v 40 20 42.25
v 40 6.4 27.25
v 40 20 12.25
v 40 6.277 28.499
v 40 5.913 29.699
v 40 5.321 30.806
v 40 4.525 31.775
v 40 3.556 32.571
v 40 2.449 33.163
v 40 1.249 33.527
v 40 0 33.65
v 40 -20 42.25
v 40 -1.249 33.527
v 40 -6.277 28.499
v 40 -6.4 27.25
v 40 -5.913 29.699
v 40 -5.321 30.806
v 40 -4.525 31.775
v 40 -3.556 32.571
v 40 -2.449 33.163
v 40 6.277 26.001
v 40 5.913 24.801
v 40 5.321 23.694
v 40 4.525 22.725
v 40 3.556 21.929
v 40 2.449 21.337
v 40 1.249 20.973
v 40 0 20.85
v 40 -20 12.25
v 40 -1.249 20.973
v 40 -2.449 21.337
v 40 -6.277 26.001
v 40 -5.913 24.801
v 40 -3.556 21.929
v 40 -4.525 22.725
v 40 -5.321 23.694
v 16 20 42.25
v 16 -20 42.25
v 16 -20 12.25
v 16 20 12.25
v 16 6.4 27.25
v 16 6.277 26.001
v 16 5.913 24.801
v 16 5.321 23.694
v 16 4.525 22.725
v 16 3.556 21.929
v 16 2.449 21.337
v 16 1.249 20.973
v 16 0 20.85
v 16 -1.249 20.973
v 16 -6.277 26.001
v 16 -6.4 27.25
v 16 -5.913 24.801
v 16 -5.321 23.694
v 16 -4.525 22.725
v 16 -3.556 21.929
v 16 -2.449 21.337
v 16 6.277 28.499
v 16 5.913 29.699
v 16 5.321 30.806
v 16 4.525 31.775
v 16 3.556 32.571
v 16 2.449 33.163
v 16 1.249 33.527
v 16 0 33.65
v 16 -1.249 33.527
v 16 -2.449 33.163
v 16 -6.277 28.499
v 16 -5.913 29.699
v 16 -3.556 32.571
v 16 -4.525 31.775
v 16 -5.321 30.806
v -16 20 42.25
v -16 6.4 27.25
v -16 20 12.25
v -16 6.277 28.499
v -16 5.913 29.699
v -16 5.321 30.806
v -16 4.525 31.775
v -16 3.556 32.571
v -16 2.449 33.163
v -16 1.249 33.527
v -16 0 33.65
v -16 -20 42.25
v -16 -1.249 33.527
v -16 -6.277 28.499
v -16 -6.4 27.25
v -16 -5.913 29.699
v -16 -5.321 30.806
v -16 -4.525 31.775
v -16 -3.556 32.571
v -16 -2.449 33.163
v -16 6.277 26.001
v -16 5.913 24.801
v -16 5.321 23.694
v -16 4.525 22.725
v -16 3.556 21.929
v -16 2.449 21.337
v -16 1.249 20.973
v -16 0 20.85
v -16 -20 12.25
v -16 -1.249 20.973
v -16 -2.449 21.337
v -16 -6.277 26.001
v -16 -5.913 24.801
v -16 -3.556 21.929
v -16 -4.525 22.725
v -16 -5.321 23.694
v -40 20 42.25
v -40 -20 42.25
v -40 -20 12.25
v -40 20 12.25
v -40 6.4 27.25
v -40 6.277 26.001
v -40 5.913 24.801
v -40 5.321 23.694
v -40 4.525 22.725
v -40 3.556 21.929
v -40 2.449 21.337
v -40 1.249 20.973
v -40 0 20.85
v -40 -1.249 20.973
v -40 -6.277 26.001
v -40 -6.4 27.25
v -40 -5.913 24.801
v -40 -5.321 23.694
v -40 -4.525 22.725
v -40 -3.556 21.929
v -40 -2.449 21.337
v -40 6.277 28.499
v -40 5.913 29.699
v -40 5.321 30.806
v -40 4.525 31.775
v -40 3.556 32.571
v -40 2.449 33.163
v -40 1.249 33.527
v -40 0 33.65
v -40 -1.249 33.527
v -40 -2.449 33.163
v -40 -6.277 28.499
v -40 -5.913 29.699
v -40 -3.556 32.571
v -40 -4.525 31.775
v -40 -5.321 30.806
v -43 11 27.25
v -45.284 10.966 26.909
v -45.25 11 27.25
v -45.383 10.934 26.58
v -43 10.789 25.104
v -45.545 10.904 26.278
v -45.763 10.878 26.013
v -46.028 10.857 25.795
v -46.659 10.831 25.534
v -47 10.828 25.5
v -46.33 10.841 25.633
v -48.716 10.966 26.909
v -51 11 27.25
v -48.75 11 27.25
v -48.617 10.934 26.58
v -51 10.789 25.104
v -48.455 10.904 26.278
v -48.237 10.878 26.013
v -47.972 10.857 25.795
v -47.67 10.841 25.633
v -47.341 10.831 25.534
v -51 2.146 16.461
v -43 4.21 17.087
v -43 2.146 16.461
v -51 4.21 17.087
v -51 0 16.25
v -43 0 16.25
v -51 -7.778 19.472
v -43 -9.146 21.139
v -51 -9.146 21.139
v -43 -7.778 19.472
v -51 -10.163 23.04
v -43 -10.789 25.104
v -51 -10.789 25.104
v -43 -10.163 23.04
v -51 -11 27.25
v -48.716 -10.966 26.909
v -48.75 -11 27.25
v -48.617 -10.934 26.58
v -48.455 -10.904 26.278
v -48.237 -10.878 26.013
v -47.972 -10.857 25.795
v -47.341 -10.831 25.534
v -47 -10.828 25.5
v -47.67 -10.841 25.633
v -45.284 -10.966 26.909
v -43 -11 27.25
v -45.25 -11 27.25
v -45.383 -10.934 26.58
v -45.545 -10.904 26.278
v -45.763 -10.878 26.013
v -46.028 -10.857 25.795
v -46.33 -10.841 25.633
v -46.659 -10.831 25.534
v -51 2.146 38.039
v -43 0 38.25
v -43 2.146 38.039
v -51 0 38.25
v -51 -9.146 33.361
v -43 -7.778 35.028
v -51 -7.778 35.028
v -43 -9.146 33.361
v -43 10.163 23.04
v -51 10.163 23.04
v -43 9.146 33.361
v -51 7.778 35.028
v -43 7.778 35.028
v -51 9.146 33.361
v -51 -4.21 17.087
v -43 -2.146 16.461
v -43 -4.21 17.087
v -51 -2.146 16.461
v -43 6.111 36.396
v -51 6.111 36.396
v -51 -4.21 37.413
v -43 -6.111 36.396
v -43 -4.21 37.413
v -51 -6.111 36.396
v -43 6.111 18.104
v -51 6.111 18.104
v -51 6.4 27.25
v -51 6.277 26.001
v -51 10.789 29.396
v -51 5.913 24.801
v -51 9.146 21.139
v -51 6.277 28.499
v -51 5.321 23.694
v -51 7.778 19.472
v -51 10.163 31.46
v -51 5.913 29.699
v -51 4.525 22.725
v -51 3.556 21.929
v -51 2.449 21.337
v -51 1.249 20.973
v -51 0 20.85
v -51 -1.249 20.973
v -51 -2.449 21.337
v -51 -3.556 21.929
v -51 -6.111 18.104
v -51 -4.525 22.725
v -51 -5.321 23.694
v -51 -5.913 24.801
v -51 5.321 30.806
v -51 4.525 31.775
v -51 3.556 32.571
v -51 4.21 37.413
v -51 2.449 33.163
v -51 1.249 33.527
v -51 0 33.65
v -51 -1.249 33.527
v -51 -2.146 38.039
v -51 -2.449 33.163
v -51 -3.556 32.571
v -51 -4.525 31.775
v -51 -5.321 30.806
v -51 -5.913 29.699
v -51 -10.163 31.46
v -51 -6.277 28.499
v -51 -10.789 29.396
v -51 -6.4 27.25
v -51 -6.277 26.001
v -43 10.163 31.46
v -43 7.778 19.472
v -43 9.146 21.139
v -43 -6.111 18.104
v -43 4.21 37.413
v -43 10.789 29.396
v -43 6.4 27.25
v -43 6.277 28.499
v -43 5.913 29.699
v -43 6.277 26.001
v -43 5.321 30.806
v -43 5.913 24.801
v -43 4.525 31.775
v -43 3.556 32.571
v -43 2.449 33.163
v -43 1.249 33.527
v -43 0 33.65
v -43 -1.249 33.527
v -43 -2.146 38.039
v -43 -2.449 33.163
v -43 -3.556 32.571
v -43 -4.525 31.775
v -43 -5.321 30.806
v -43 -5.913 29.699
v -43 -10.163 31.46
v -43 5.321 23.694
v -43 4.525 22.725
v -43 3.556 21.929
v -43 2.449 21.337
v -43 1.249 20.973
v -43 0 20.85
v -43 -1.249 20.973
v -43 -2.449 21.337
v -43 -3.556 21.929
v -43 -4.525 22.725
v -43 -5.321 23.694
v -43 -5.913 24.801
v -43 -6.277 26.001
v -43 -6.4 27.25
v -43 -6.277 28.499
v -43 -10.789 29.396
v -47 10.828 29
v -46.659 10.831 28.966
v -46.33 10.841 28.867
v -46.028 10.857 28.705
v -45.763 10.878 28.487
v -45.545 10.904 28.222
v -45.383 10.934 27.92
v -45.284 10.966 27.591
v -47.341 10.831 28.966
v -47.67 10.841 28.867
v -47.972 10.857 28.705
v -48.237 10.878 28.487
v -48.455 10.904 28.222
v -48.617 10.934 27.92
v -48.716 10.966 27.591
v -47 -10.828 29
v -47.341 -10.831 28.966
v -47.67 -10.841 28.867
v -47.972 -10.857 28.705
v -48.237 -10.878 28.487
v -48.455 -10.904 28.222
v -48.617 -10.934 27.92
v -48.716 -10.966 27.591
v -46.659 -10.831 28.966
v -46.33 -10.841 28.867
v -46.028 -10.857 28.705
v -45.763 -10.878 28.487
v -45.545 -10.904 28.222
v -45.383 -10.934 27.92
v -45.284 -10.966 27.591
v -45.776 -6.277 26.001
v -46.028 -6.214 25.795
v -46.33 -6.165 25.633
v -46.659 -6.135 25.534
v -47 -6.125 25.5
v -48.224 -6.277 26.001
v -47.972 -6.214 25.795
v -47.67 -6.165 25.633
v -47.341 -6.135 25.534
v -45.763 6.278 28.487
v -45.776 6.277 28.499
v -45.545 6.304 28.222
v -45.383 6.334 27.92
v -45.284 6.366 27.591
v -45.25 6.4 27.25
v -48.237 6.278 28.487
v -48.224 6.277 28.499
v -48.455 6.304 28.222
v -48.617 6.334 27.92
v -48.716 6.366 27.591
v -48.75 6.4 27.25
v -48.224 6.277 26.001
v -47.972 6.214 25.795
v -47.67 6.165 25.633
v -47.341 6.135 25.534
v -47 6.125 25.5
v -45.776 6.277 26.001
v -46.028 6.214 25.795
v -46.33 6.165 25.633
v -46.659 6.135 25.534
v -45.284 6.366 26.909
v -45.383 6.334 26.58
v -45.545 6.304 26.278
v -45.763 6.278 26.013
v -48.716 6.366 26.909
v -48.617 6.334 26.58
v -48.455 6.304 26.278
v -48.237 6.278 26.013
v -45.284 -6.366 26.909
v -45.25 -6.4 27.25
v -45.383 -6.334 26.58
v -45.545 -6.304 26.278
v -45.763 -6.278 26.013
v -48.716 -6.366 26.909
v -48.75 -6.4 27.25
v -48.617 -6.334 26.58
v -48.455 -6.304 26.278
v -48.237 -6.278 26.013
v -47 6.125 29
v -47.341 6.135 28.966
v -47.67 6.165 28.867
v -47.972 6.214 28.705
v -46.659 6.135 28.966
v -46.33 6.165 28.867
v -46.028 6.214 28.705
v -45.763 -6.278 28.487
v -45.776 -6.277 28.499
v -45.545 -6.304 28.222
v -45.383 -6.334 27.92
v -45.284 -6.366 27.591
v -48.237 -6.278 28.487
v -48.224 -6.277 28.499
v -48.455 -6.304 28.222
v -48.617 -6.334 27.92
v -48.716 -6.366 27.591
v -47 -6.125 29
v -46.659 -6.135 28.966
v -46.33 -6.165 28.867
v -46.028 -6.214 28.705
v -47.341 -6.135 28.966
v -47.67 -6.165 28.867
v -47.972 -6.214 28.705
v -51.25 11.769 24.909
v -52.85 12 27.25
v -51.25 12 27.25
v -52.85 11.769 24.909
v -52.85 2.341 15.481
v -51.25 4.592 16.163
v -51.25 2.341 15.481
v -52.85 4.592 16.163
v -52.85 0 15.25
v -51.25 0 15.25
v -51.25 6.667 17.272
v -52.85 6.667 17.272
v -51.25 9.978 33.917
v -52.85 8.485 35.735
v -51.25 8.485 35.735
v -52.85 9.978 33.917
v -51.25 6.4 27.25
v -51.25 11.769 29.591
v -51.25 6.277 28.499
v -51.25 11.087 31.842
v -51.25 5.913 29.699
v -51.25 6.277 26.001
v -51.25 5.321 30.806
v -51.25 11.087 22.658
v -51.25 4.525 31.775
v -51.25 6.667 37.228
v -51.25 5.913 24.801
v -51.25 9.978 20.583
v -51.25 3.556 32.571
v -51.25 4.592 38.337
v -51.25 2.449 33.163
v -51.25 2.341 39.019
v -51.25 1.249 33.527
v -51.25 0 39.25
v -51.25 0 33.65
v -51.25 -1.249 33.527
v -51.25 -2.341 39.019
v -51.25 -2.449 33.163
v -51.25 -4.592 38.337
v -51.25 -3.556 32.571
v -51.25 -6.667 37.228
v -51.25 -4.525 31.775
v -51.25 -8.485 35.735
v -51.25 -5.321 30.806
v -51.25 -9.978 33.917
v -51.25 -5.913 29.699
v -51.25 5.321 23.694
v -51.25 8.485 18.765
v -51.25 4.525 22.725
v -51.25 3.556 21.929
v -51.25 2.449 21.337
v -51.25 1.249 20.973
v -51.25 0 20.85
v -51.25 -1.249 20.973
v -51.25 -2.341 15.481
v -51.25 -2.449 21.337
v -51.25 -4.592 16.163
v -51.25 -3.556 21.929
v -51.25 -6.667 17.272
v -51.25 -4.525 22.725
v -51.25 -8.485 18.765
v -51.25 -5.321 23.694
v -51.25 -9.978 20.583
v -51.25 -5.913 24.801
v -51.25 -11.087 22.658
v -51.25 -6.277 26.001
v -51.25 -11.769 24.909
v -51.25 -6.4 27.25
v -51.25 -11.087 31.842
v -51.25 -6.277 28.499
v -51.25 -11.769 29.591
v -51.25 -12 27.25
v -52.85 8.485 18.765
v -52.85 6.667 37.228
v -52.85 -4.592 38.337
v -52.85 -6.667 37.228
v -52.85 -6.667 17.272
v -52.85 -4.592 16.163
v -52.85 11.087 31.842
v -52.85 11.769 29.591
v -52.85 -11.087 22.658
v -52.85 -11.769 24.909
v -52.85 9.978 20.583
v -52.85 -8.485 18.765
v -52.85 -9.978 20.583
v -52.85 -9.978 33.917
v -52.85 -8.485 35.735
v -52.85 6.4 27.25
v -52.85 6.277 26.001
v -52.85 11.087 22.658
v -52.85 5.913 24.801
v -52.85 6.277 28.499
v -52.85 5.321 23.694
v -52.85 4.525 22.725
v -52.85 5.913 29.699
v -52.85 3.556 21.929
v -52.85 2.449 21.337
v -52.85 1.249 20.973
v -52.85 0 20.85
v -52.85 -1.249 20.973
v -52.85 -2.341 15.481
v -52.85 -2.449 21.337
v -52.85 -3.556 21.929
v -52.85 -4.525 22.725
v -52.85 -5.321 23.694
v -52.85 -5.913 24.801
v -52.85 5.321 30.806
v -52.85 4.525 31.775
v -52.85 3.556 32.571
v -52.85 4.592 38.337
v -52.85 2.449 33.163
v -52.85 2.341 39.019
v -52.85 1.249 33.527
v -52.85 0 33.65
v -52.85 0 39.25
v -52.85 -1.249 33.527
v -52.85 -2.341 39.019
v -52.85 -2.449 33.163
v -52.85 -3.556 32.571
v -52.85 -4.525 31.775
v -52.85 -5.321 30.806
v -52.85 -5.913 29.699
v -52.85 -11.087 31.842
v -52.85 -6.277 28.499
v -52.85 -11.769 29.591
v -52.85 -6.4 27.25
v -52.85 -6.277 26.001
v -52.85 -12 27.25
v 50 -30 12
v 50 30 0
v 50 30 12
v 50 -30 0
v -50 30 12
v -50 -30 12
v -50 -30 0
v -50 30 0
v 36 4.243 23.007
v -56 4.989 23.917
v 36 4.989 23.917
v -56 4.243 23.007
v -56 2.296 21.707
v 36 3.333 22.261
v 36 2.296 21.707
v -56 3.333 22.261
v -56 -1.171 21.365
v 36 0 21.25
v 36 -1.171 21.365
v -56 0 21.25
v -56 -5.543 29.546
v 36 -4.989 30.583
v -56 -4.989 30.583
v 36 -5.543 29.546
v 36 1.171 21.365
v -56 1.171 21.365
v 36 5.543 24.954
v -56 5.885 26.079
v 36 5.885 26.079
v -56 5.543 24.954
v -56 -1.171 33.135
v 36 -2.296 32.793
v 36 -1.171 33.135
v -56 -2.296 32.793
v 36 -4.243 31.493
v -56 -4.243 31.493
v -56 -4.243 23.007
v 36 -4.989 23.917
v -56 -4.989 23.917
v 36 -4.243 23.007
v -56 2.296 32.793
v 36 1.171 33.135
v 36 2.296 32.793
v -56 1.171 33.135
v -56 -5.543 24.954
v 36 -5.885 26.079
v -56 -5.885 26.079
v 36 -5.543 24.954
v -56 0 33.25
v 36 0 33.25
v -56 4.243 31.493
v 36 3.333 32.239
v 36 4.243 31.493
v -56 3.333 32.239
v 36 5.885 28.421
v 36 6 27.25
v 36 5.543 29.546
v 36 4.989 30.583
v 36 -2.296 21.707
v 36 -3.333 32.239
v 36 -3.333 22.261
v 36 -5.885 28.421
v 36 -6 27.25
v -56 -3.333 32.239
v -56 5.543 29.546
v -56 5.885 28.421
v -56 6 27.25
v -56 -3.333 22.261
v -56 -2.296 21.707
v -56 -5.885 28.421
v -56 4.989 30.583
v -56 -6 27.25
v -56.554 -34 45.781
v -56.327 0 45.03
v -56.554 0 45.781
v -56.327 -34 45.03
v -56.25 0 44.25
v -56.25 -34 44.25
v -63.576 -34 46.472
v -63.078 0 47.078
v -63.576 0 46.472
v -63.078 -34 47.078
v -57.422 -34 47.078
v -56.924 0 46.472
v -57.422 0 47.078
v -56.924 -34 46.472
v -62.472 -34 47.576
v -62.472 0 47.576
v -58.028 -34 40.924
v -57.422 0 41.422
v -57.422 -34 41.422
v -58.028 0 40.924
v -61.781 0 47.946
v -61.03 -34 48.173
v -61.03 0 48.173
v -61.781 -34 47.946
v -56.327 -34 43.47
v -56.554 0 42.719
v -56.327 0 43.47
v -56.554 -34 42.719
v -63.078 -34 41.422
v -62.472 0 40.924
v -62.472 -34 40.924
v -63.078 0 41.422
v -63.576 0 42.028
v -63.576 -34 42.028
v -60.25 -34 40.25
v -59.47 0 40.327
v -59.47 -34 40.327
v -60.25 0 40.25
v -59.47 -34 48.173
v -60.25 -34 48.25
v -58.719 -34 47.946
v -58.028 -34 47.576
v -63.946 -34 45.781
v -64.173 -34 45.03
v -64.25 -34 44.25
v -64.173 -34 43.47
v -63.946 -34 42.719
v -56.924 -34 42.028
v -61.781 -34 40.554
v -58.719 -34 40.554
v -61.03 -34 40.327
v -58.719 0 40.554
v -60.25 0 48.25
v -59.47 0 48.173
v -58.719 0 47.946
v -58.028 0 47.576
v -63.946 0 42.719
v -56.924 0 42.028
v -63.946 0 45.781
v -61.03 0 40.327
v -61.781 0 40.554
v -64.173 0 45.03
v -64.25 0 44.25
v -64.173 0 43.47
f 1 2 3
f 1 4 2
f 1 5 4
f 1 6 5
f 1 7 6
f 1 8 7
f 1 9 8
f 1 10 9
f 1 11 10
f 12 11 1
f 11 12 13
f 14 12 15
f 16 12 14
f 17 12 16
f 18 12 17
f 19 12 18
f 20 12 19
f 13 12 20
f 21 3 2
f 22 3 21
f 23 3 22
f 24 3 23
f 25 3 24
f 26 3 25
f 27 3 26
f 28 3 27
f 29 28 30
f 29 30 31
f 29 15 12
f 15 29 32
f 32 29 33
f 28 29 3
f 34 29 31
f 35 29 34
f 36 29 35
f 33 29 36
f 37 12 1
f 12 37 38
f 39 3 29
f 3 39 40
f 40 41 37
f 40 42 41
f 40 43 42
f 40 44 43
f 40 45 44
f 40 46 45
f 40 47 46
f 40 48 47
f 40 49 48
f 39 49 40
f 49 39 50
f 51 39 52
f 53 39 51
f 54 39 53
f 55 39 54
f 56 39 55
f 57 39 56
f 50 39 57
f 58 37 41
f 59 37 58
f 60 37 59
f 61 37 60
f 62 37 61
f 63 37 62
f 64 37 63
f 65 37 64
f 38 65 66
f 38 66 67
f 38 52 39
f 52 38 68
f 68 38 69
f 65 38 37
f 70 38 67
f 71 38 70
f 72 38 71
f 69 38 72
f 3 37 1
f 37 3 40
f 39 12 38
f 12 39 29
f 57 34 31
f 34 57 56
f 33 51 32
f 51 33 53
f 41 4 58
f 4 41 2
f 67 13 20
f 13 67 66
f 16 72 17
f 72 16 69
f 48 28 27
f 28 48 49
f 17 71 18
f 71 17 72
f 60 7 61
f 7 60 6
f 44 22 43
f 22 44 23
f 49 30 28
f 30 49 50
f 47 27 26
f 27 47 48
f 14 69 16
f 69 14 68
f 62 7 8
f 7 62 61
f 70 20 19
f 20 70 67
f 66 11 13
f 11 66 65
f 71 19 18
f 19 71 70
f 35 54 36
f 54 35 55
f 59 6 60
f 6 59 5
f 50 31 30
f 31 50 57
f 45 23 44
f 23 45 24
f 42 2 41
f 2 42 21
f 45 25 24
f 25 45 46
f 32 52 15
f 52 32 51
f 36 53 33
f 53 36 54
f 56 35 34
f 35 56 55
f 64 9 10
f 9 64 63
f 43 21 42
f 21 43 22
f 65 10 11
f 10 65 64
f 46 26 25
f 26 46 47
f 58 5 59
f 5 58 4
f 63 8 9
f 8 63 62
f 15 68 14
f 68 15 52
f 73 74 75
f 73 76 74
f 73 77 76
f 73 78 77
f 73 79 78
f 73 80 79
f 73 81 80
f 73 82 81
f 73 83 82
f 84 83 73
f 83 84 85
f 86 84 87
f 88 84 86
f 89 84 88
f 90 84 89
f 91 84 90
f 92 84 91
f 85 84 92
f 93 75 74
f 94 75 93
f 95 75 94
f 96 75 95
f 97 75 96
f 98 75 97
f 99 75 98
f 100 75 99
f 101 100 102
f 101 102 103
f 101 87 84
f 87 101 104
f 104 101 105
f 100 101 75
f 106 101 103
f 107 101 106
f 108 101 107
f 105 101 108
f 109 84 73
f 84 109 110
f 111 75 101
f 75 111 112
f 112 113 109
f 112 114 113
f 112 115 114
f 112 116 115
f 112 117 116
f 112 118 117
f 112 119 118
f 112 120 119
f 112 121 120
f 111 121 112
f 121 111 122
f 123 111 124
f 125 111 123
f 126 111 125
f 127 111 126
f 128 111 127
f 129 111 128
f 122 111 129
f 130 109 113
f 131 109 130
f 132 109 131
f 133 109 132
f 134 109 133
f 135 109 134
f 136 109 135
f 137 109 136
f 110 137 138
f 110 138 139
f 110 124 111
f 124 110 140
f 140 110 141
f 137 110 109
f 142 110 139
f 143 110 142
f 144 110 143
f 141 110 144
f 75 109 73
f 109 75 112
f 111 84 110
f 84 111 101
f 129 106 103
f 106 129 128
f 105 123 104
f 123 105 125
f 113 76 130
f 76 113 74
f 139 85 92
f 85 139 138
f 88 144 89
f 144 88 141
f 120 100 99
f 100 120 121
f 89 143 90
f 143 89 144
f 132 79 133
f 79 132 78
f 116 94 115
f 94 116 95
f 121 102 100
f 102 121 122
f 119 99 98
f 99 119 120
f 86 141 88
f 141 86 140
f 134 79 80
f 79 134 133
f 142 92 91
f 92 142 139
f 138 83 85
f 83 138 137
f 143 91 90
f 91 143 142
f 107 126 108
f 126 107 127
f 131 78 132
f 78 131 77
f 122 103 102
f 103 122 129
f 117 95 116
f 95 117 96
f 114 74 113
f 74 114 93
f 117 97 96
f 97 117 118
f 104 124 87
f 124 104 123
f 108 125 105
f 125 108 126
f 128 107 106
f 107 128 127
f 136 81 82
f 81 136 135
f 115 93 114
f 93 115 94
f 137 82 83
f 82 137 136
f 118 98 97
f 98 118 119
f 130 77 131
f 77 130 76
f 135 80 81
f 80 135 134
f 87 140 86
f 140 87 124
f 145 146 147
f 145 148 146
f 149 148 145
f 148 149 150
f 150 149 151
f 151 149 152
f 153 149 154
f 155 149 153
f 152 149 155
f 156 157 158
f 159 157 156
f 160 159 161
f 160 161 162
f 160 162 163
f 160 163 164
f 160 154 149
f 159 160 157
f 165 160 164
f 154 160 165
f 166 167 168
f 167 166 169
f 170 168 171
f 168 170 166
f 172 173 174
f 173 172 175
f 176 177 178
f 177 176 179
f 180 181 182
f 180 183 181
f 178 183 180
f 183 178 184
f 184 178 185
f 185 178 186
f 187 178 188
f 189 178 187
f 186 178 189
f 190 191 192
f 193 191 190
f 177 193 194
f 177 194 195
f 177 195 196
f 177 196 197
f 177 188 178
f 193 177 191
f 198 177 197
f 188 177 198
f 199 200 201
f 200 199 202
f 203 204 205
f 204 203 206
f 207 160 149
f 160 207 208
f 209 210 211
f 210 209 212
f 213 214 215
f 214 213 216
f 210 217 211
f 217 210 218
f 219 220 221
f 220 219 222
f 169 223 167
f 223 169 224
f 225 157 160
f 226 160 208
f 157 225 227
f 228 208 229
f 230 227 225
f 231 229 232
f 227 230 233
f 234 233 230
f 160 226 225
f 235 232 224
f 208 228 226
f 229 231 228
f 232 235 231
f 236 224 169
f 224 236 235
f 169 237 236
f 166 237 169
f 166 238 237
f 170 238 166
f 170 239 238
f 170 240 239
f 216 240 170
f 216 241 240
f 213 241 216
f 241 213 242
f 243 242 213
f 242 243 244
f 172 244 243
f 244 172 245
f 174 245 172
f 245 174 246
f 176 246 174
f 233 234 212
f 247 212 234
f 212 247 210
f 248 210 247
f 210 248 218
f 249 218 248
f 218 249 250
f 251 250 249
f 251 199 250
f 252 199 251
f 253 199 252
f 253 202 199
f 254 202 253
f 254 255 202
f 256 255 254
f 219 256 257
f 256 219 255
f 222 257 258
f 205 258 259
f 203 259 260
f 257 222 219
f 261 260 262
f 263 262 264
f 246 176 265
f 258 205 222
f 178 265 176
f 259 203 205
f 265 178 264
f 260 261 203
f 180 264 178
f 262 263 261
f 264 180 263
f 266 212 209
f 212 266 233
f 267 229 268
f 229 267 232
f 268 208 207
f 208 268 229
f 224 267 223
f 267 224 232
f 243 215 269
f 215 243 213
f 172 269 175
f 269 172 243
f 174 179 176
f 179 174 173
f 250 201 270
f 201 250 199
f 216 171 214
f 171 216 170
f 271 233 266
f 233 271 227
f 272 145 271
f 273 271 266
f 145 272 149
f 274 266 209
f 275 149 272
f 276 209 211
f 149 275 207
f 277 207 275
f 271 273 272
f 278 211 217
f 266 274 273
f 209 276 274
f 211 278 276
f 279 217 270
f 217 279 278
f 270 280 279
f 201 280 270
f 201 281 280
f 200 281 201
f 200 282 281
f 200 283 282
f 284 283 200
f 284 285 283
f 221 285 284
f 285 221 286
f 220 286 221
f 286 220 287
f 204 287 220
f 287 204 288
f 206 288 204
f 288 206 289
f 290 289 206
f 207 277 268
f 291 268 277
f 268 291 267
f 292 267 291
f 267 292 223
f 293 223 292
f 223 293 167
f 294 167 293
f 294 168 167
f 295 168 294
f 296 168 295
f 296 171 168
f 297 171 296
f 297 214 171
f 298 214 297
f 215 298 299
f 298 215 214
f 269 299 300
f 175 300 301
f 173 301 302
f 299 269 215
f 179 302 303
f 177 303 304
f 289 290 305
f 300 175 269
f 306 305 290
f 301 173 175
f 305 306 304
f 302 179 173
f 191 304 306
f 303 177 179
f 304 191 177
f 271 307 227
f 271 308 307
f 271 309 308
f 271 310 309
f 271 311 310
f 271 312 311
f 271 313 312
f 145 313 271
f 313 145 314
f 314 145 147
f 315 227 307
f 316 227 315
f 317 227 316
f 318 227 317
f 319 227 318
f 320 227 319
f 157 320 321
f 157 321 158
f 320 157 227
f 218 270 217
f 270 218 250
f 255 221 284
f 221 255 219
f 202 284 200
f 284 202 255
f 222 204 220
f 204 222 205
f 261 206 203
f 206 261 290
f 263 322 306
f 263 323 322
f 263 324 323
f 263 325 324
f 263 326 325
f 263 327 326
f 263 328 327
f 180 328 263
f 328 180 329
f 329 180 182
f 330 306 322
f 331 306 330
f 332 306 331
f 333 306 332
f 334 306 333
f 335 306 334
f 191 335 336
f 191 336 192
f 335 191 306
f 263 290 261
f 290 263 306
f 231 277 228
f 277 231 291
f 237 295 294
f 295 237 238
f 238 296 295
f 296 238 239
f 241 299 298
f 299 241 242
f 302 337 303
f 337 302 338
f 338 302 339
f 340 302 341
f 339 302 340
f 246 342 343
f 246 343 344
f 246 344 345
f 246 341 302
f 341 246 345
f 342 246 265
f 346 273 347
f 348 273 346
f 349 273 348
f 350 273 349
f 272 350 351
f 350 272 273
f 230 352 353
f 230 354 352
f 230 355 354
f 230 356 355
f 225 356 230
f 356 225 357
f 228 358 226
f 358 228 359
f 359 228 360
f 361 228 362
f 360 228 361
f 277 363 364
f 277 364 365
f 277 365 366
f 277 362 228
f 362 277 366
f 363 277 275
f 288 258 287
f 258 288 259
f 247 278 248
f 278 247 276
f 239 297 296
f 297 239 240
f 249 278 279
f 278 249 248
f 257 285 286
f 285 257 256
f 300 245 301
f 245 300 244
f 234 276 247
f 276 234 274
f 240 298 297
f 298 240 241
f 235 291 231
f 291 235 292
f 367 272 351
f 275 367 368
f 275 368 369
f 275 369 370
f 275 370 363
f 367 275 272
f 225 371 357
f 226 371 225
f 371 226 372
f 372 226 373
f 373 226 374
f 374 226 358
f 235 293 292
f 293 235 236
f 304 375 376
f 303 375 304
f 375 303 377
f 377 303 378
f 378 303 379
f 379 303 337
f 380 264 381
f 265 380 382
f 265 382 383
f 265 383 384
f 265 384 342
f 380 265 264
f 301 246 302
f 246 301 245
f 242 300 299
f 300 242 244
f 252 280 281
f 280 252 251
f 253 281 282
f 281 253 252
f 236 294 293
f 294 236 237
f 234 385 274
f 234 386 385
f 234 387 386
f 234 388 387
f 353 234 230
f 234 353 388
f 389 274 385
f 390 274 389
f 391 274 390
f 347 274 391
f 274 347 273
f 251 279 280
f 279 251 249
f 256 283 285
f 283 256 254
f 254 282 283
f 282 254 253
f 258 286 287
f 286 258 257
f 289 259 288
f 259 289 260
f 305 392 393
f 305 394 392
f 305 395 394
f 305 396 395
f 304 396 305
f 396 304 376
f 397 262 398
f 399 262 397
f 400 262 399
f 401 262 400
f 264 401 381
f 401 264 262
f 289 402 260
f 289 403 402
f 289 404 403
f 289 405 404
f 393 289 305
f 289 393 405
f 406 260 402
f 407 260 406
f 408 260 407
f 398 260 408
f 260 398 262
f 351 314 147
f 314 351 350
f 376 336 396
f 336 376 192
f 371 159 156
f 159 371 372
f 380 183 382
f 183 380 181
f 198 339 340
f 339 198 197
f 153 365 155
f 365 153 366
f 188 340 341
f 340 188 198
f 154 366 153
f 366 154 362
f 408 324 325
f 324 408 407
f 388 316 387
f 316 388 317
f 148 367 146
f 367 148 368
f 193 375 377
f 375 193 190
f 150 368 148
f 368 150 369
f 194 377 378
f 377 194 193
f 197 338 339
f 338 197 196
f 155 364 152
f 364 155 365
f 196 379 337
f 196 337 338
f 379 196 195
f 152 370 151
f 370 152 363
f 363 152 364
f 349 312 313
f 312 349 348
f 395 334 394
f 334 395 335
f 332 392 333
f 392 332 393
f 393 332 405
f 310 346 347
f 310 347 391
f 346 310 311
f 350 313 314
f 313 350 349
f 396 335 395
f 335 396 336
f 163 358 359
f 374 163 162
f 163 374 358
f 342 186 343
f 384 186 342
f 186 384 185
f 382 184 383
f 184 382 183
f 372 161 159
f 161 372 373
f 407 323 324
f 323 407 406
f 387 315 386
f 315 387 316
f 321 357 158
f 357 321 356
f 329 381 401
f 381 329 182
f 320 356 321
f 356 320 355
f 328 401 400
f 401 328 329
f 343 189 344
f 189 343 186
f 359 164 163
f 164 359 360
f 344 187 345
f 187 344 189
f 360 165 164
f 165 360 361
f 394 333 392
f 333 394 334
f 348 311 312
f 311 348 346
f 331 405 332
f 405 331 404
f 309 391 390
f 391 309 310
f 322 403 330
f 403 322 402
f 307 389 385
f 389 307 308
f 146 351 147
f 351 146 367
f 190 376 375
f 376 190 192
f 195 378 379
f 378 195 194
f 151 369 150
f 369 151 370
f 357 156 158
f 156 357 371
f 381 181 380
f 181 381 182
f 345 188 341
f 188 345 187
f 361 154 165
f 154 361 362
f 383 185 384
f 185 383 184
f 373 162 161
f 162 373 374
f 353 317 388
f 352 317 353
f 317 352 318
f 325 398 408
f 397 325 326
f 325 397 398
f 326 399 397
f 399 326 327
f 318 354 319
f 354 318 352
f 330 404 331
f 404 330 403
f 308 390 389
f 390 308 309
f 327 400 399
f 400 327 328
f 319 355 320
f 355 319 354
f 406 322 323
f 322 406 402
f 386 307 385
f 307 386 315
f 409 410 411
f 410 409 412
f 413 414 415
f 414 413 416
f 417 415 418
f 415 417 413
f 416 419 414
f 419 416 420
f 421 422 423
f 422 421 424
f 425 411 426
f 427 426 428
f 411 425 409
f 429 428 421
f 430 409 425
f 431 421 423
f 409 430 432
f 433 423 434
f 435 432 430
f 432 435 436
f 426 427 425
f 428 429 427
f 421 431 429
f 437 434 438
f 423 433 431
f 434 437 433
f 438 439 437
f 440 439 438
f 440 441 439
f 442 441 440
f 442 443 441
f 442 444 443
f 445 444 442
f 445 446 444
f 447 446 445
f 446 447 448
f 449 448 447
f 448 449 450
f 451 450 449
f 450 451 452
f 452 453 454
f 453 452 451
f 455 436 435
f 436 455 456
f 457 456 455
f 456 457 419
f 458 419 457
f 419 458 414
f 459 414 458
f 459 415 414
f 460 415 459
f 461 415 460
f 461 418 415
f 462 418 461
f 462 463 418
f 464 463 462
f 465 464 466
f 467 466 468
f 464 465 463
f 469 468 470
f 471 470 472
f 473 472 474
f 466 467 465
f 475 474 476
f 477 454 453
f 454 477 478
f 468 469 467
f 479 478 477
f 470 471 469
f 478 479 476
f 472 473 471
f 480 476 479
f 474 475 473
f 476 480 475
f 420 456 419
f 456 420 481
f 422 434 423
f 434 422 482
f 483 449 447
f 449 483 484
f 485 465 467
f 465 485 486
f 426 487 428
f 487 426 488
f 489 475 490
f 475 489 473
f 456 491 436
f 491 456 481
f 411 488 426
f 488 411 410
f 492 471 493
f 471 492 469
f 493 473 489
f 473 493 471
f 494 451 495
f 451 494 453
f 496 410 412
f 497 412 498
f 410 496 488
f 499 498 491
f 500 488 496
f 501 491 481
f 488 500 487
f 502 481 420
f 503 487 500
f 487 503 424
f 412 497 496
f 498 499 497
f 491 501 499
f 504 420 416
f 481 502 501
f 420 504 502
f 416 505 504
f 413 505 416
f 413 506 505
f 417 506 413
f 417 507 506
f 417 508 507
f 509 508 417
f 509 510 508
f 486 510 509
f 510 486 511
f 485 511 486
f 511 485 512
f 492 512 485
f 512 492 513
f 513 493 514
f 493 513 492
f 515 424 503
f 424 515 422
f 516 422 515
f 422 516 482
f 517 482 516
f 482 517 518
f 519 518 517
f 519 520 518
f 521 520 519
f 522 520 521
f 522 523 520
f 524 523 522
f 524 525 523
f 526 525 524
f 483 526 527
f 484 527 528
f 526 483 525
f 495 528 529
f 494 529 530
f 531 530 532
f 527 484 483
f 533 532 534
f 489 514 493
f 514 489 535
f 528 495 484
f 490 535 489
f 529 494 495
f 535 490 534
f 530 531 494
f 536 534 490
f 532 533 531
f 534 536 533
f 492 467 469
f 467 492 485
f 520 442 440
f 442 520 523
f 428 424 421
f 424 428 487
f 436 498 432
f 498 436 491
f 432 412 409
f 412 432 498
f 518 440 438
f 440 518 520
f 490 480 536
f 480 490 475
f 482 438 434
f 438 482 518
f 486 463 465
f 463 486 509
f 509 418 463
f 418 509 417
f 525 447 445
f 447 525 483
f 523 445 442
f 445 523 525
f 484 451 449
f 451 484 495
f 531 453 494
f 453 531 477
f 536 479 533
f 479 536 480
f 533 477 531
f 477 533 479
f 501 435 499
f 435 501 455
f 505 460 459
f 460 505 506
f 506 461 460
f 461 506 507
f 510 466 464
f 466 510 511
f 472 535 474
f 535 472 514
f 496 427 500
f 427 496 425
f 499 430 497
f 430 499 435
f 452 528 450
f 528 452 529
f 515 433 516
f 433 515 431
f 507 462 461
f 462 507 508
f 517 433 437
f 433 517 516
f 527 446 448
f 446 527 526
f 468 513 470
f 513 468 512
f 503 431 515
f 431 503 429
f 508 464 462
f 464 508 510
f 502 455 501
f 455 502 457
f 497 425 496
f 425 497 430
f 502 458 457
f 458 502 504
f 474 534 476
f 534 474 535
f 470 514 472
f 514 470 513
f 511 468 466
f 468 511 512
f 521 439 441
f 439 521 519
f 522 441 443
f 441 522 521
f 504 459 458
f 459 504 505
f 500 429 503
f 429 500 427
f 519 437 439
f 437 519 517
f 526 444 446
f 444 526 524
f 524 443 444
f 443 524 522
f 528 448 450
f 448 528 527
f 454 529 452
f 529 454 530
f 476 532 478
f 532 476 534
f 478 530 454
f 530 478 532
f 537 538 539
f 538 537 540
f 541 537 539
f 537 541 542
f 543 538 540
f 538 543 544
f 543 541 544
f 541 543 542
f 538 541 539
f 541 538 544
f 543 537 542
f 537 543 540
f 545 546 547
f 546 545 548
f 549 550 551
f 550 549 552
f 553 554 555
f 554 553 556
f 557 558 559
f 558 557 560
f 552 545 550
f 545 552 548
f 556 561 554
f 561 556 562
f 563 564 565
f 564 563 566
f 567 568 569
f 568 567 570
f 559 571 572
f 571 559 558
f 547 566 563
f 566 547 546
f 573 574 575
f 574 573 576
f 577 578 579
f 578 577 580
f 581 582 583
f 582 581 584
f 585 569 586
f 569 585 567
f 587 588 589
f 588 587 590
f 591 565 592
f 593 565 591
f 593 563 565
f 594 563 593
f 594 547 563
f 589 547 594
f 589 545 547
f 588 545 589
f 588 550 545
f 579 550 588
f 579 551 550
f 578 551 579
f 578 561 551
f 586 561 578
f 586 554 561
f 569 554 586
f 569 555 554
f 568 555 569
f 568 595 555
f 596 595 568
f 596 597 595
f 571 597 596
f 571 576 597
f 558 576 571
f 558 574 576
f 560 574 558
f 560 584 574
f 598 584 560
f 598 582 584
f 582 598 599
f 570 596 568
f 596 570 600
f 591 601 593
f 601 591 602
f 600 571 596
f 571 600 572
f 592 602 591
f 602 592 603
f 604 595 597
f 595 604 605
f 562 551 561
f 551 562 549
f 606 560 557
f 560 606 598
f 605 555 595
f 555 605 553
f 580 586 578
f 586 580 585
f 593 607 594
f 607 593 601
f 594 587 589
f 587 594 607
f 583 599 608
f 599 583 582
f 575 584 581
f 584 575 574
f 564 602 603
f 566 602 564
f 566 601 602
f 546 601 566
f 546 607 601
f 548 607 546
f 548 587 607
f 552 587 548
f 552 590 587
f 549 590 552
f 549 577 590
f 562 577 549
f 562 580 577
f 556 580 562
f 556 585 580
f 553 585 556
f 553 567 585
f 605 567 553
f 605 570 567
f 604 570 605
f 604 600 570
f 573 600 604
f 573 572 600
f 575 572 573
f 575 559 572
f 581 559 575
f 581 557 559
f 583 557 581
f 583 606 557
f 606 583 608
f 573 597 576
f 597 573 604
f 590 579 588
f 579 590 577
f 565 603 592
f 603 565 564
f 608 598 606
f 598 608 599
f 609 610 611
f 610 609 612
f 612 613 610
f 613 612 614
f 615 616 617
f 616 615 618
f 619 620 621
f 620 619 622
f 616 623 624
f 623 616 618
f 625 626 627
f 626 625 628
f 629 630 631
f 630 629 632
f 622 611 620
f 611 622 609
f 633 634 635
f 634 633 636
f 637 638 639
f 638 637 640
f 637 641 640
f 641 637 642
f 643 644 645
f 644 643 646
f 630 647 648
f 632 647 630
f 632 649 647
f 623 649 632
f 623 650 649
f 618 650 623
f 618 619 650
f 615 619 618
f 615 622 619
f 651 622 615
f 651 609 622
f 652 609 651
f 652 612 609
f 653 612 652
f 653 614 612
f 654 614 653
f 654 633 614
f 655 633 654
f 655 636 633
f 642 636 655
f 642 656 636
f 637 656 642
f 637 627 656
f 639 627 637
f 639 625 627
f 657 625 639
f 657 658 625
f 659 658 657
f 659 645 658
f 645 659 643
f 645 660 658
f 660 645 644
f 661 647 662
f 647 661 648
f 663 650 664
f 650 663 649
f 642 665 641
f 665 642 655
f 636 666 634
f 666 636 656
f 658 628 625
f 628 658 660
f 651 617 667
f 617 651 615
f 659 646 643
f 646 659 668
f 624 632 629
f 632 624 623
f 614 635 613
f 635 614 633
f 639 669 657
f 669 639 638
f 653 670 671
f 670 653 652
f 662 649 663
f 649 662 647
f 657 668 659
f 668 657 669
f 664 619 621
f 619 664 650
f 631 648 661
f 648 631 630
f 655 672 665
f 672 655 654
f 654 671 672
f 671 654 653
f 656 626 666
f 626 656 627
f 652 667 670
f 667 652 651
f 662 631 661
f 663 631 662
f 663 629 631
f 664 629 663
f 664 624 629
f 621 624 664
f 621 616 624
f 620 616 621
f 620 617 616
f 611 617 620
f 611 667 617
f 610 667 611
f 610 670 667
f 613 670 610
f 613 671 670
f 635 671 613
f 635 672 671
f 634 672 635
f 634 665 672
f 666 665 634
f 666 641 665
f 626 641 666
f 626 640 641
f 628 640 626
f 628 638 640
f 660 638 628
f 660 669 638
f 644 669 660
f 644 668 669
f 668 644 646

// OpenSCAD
$fn = 32;

// ------------------------------------------------------------------------
// Machine vise: screw d12, jaws 24 x 30 mm
// Every part is its own module, assembly() places every instance.
// ------------------------------------------------------------------------

// --- part 1 ---
module vise_bed() {
  difference() {
    translate([-50, -30, 0]) cube([100, 60, 12]);
  }
}

// --- part 2 ---
module vise_jaw() {
  difference() {
    translate([-12, -20, 0]) cube([24, 40, 30]);
    translate([0, 0, 15]) rotate([0, 90, 0]) cylinder(h = 26, d = 12.8, center = true);
  }
}

// --- part 3 ---
module vise_screw() {
  translate([0, 0, -46]) cylinder(h = 92, d = 12);
}

// --- part 4 ---
module screw_collar() {
  difference() {
    cylinder(h = 8, d = 22);
    translate([0, 0, -1]) cylinder(h = 10, d = 12.8);
    translate([0, 0, 4]) rotate([90, 0, 0]) cylinder(h = 24, d = 3.5, center = true);
  }
}

// --- part 5 ---
module screw_washer() {
  difference() {
      translate([0, 0, 0]) cylinder(h = 1.6, d = 24);
      translate([0, 0, -1]) cylinder(h = 3.6, d = 12.8);
    }
}

// --- part 6 ---
module vise_handle() {
  cylinder(h = 34, d = 8);
}

// --- assembly ---
module assembly() {
  color([0.80, 0.24, 0.20]) translate([0, 0, 0]) rotate([0, 0, 0]) vise_bed();
  color([0.20, 0.45, 0.75]) translate([28, 0, 12.25]) rotate([0, 0, 0]) vise_jaw();
  color([0.25, 0.62, 0.32]) translate([-28, 0, 12.25]) rotate([0, 0, 0]) vise_jaw();
  color([0.92, 0.70, 0.18]) translate([-10, 0, 27.25]) rotate([0, 90, 0]) vise_screw();
  color([0.58, 0.35, 0.70]) translate([-51, 0, 27.25]) rotate([0, 90, 0]) screw_collar();
  color([0.16, 0.66, 0.66]) translate([-52.85, 0, 27.25]) rotate([0, 90, 0]) screw_washer();
  color([0.85, 0.48, 0.18]) translate([-60.25, 0, 44.25]) rotate([90, 0, 0]) vise_handle();
}

assembly();
